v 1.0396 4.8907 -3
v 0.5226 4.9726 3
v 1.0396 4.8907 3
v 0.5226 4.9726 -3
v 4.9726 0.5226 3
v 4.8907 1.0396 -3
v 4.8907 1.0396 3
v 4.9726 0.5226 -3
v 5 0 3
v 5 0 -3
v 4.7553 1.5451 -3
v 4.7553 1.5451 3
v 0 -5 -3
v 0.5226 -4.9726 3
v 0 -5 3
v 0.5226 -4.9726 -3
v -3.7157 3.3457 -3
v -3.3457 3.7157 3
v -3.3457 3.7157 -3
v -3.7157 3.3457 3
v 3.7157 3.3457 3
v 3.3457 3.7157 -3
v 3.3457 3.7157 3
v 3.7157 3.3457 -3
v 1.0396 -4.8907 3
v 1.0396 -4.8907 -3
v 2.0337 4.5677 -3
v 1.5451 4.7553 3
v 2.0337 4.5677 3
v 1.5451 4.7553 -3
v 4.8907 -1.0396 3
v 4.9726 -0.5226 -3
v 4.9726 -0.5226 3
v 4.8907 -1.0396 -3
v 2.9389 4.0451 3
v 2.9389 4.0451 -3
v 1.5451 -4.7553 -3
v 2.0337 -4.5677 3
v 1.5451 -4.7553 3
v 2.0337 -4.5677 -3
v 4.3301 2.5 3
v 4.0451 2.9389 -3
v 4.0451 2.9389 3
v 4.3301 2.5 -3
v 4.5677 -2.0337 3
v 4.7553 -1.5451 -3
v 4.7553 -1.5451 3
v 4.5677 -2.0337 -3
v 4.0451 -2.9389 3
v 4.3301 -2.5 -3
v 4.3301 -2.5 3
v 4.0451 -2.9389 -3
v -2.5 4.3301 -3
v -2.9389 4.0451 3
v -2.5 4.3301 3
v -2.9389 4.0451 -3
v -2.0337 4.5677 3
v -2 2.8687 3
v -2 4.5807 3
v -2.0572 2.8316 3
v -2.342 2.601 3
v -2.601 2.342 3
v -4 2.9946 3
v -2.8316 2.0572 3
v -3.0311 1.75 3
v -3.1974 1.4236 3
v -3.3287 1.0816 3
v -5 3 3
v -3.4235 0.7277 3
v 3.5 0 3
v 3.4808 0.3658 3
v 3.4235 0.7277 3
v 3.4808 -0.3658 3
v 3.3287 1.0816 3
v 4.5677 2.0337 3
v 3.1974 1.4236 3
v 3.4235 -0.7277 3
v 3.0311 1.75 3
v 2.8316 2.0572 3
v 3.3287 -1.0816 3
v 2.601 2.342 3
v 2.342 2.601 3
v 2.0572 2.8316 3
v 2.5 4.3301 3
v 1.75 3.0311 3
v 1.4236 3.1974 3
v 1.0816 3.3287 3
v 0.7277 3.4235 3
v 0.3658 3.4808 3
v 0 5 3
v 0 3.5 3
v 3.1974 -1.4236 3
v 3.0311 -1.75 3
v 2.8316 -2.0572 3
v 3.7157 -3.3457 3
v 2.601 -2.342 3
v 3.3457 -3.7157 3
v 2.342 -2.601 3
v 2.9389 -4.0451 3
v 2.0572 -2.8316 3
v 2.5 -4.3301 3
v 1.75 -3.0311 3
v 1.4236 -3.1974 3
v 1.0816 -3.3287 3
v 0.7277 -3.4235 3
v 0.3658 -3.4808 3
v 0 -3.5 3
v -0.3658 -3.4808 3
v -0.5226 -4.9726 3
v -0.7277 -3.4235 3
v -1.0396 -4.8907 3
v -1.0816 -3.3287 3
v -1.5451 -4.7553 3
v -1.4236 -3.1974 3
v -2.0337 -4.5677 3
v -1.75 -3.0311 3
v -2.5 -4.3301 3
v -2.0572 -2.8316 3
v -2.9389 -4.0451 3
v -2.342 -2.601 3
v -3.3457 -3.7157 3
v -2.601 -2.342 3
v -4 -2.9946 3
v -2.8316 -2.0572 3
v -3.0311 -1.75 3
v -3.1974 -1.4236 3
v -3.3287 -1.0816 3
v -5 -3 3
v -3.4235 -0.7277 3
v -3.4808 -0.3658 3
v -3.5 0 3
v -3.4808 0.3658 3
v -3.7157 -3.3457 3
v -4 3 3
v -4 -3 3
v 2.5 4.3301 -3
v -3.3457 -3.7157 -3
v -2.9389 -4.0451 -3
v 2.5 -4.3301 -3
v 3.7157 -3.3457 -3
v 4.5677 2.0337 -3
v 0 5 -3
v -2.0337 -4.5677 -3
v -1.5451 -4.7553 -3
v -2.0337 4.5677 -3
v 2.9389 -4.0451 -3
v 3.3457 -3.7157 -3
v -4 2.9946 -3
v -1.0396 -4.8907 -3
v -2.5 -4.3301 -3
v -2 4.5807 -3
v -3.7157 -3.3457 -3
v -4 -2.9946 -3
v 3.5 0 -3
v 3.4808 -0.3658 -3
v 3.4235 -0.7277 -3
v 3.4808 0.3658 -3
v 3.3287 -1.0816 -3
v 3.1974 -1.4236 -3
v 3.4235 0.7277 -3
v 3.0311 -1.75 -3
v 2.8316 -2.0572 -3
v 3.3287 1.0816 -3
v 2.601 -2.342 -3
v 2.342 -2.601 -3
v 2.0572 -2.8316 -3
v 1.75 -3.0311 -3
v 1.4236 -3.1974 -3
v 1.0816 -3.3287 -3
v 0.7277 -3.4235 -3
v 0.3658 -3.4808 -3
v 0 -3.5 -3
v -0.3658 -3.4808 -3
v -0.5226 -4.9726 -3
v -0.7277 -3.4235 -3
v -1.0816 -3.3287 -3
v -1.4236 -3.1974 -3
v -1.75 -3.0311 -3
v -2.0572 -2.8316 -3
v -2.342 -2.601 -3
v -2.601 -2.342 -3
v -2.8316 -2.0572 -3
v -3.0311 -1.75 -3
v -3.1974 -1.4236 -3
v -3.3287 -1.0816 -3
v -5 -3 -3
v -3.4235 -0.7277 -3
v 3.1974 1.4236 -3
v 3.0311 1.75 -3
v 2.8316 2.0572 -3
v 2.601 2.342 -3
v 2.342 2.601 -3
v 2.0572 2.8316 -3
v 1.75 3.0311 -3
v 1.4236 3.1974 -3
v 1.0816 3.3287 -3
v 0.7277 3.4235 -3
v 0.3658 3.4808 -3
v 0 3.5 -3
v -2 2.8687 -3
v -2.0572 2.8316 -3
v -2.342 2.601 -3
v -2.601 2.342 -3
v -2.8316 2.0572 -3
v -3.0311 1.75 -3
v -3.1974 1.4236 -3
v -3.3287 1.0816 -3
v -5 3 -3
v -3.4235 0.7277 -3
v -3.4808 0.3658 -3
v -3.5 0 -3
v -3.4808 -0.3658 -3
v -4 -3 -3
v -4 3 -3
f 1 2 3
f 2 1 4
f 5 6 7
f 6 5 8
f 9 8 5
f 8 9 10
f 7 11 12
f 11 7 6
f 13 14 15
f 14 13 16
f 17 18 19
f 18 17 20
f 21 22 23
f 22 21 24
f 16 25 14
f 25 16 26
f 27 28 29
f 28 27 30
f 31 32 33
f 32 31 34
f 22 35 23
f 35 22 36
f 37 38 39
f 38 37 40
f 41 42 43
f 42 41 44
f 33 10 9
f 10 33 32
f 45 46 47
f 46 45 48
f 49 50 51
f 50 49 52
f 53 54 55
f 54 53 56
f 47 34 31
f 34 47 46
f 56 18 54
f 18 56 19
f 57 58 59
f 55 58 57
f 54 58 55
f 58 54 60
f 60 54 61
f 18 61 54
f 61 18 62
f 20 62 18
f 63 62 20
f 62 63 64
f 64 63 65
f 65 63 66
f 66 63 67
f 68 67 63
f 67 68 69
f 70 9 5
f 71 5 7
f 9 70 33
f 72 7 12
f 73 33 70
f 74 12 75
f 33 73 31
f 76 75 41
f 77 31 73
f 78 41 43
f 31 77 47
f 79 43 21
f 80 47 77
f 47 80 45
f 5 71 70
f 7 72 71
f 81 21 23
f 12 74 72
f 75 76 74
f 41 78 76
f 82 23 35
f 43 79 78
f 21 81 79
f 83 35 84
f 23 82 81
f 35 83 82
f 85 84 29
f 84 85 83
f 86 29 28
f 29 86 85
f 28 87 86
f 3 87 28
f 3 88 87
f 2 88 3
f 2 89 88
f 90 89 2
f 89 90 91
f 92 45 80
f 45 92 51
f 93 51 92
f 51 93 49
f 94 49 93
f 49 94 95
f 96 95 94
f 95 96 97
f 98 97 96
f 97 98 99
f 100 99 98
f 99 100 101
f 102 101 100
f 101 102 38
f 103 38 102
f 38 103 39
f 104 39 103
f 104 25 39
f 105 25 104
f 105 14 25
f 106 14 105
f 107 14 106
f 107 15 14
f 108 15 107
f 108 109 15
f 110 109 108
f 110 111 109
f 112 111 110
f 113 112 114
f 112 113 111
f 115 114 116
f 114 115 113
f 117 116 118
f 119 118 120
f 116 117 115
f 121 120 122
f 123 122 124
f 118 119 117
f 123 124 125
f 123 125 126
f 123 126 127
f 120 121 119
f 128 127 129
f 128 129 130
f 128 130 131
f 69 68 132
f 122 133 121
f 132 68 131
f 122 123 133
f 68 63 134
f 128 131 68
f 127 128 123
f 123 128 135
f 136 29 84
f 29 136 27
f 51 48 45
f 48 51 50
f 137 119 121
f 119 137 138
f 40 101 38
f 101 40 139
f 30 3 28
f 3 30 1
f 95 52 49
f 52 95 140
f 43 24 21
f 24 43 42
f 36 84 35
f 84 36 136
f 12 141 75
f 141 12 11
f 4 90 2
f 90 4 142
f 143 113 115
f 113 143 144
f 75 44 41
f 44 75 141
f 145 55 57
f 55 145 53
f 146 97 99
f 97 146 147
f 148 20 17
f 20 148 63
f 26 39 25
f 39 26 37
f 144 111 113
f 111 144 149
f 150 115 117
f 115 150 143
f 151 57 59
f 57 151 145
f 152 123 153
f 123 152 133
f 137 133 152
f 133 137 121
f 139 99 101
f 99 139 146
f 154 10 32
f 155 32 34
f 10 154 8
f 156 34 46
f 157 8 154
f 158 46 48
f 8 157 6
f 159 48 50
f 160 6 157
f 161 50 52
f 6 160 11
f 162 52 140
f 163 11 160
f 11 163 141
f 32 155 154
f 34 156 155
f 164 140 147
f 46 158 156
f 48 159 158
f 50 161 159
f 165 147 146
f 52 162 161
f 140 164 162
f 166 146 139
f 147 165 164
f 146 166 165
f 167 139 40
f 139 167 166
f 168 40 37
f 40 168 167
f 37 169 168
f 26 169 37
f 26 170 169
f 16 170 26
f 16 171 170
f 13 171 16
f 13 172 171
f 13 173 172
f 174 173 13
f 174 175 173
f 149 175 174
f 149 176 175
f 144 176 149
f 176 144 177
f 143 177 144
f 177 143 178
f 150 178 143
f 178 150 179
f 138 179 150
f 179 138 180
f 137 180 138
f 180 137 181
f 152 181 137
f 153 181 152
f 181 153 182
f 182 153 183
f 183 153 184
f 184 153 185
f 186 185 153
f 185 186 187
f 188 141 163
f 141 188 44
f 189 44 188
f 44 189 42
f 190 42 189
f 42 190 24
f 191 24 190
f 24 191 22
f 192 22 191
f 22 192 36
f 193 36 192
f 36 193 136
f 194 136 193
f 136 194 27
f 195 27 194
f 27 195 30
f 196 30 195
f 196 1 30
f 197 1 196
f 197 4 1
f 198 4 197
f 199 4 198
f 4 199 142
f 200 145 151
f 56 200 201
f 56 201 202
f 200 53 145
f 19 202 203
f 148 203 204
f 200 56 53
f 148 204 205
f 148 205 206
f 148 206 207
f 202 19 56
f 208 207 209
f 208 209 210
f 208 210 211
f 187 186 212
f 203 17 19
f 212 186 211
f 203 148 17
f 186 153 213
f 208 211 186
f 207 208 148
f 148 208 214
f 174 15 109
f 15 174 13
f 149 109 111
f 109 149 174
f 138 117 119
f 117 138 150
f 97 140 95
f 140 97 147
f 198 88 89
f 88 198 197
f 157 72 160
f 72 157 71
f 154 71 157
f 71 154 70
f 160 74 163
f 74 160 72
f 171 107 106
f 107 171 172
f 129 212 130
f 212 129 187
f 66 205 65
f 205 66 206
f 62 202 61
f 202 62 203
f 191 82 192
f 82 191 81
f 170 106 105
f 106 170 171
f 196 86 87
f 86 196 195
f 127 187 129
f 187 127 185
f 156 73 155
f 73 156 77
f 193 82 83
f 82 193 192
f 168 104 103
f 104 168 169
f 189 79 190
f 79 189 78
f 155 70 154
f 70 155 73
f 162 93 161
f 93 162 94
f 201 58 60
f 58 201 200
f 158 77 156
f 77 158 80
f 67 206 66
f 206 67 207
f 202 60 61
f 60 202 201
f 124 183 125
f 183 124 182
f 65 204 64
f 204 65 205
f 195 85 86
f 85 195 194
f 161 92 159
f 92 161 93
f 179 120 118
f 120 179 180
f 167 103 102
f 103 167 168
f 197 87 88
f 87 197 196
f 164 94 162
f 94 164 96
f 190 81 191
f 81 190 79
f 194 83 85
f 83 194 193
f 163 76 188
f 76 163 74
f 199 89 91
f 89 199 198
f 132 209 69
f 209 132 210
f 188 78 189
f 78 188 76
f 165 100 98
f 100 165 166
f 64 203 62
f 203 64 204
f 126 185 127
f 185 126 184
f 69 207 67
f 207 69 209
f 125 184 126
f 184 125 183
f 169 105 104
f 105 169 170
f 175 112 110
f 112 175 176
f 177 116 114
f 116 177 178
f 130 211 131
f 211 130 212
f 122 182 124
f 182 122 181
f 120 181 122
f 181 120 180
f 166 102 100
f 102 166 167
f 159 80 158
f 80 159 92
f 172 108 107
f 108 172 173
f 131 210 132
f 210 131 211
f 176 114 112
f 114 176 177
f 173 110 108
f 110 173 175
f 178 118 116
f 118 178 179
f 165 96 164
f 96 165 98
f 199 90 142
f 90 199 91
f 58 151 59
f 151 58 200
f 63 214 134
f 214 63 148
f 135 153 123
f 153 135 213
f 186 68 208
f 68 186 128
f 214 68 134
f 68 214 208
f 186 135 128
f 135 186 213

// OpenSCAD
$fn=60;
color("SlateGray")

difference(){
cylinder(h = 6, d=10, center = true);
cylinder(h = 9, d=7, center = true);
translate(v = [-2, 2, -4.5])

cube(size = [2,9,9]);
}
color("SlateGray")
translate(v = [-5, -3, -3])
cube(size = [1,6,6]);
